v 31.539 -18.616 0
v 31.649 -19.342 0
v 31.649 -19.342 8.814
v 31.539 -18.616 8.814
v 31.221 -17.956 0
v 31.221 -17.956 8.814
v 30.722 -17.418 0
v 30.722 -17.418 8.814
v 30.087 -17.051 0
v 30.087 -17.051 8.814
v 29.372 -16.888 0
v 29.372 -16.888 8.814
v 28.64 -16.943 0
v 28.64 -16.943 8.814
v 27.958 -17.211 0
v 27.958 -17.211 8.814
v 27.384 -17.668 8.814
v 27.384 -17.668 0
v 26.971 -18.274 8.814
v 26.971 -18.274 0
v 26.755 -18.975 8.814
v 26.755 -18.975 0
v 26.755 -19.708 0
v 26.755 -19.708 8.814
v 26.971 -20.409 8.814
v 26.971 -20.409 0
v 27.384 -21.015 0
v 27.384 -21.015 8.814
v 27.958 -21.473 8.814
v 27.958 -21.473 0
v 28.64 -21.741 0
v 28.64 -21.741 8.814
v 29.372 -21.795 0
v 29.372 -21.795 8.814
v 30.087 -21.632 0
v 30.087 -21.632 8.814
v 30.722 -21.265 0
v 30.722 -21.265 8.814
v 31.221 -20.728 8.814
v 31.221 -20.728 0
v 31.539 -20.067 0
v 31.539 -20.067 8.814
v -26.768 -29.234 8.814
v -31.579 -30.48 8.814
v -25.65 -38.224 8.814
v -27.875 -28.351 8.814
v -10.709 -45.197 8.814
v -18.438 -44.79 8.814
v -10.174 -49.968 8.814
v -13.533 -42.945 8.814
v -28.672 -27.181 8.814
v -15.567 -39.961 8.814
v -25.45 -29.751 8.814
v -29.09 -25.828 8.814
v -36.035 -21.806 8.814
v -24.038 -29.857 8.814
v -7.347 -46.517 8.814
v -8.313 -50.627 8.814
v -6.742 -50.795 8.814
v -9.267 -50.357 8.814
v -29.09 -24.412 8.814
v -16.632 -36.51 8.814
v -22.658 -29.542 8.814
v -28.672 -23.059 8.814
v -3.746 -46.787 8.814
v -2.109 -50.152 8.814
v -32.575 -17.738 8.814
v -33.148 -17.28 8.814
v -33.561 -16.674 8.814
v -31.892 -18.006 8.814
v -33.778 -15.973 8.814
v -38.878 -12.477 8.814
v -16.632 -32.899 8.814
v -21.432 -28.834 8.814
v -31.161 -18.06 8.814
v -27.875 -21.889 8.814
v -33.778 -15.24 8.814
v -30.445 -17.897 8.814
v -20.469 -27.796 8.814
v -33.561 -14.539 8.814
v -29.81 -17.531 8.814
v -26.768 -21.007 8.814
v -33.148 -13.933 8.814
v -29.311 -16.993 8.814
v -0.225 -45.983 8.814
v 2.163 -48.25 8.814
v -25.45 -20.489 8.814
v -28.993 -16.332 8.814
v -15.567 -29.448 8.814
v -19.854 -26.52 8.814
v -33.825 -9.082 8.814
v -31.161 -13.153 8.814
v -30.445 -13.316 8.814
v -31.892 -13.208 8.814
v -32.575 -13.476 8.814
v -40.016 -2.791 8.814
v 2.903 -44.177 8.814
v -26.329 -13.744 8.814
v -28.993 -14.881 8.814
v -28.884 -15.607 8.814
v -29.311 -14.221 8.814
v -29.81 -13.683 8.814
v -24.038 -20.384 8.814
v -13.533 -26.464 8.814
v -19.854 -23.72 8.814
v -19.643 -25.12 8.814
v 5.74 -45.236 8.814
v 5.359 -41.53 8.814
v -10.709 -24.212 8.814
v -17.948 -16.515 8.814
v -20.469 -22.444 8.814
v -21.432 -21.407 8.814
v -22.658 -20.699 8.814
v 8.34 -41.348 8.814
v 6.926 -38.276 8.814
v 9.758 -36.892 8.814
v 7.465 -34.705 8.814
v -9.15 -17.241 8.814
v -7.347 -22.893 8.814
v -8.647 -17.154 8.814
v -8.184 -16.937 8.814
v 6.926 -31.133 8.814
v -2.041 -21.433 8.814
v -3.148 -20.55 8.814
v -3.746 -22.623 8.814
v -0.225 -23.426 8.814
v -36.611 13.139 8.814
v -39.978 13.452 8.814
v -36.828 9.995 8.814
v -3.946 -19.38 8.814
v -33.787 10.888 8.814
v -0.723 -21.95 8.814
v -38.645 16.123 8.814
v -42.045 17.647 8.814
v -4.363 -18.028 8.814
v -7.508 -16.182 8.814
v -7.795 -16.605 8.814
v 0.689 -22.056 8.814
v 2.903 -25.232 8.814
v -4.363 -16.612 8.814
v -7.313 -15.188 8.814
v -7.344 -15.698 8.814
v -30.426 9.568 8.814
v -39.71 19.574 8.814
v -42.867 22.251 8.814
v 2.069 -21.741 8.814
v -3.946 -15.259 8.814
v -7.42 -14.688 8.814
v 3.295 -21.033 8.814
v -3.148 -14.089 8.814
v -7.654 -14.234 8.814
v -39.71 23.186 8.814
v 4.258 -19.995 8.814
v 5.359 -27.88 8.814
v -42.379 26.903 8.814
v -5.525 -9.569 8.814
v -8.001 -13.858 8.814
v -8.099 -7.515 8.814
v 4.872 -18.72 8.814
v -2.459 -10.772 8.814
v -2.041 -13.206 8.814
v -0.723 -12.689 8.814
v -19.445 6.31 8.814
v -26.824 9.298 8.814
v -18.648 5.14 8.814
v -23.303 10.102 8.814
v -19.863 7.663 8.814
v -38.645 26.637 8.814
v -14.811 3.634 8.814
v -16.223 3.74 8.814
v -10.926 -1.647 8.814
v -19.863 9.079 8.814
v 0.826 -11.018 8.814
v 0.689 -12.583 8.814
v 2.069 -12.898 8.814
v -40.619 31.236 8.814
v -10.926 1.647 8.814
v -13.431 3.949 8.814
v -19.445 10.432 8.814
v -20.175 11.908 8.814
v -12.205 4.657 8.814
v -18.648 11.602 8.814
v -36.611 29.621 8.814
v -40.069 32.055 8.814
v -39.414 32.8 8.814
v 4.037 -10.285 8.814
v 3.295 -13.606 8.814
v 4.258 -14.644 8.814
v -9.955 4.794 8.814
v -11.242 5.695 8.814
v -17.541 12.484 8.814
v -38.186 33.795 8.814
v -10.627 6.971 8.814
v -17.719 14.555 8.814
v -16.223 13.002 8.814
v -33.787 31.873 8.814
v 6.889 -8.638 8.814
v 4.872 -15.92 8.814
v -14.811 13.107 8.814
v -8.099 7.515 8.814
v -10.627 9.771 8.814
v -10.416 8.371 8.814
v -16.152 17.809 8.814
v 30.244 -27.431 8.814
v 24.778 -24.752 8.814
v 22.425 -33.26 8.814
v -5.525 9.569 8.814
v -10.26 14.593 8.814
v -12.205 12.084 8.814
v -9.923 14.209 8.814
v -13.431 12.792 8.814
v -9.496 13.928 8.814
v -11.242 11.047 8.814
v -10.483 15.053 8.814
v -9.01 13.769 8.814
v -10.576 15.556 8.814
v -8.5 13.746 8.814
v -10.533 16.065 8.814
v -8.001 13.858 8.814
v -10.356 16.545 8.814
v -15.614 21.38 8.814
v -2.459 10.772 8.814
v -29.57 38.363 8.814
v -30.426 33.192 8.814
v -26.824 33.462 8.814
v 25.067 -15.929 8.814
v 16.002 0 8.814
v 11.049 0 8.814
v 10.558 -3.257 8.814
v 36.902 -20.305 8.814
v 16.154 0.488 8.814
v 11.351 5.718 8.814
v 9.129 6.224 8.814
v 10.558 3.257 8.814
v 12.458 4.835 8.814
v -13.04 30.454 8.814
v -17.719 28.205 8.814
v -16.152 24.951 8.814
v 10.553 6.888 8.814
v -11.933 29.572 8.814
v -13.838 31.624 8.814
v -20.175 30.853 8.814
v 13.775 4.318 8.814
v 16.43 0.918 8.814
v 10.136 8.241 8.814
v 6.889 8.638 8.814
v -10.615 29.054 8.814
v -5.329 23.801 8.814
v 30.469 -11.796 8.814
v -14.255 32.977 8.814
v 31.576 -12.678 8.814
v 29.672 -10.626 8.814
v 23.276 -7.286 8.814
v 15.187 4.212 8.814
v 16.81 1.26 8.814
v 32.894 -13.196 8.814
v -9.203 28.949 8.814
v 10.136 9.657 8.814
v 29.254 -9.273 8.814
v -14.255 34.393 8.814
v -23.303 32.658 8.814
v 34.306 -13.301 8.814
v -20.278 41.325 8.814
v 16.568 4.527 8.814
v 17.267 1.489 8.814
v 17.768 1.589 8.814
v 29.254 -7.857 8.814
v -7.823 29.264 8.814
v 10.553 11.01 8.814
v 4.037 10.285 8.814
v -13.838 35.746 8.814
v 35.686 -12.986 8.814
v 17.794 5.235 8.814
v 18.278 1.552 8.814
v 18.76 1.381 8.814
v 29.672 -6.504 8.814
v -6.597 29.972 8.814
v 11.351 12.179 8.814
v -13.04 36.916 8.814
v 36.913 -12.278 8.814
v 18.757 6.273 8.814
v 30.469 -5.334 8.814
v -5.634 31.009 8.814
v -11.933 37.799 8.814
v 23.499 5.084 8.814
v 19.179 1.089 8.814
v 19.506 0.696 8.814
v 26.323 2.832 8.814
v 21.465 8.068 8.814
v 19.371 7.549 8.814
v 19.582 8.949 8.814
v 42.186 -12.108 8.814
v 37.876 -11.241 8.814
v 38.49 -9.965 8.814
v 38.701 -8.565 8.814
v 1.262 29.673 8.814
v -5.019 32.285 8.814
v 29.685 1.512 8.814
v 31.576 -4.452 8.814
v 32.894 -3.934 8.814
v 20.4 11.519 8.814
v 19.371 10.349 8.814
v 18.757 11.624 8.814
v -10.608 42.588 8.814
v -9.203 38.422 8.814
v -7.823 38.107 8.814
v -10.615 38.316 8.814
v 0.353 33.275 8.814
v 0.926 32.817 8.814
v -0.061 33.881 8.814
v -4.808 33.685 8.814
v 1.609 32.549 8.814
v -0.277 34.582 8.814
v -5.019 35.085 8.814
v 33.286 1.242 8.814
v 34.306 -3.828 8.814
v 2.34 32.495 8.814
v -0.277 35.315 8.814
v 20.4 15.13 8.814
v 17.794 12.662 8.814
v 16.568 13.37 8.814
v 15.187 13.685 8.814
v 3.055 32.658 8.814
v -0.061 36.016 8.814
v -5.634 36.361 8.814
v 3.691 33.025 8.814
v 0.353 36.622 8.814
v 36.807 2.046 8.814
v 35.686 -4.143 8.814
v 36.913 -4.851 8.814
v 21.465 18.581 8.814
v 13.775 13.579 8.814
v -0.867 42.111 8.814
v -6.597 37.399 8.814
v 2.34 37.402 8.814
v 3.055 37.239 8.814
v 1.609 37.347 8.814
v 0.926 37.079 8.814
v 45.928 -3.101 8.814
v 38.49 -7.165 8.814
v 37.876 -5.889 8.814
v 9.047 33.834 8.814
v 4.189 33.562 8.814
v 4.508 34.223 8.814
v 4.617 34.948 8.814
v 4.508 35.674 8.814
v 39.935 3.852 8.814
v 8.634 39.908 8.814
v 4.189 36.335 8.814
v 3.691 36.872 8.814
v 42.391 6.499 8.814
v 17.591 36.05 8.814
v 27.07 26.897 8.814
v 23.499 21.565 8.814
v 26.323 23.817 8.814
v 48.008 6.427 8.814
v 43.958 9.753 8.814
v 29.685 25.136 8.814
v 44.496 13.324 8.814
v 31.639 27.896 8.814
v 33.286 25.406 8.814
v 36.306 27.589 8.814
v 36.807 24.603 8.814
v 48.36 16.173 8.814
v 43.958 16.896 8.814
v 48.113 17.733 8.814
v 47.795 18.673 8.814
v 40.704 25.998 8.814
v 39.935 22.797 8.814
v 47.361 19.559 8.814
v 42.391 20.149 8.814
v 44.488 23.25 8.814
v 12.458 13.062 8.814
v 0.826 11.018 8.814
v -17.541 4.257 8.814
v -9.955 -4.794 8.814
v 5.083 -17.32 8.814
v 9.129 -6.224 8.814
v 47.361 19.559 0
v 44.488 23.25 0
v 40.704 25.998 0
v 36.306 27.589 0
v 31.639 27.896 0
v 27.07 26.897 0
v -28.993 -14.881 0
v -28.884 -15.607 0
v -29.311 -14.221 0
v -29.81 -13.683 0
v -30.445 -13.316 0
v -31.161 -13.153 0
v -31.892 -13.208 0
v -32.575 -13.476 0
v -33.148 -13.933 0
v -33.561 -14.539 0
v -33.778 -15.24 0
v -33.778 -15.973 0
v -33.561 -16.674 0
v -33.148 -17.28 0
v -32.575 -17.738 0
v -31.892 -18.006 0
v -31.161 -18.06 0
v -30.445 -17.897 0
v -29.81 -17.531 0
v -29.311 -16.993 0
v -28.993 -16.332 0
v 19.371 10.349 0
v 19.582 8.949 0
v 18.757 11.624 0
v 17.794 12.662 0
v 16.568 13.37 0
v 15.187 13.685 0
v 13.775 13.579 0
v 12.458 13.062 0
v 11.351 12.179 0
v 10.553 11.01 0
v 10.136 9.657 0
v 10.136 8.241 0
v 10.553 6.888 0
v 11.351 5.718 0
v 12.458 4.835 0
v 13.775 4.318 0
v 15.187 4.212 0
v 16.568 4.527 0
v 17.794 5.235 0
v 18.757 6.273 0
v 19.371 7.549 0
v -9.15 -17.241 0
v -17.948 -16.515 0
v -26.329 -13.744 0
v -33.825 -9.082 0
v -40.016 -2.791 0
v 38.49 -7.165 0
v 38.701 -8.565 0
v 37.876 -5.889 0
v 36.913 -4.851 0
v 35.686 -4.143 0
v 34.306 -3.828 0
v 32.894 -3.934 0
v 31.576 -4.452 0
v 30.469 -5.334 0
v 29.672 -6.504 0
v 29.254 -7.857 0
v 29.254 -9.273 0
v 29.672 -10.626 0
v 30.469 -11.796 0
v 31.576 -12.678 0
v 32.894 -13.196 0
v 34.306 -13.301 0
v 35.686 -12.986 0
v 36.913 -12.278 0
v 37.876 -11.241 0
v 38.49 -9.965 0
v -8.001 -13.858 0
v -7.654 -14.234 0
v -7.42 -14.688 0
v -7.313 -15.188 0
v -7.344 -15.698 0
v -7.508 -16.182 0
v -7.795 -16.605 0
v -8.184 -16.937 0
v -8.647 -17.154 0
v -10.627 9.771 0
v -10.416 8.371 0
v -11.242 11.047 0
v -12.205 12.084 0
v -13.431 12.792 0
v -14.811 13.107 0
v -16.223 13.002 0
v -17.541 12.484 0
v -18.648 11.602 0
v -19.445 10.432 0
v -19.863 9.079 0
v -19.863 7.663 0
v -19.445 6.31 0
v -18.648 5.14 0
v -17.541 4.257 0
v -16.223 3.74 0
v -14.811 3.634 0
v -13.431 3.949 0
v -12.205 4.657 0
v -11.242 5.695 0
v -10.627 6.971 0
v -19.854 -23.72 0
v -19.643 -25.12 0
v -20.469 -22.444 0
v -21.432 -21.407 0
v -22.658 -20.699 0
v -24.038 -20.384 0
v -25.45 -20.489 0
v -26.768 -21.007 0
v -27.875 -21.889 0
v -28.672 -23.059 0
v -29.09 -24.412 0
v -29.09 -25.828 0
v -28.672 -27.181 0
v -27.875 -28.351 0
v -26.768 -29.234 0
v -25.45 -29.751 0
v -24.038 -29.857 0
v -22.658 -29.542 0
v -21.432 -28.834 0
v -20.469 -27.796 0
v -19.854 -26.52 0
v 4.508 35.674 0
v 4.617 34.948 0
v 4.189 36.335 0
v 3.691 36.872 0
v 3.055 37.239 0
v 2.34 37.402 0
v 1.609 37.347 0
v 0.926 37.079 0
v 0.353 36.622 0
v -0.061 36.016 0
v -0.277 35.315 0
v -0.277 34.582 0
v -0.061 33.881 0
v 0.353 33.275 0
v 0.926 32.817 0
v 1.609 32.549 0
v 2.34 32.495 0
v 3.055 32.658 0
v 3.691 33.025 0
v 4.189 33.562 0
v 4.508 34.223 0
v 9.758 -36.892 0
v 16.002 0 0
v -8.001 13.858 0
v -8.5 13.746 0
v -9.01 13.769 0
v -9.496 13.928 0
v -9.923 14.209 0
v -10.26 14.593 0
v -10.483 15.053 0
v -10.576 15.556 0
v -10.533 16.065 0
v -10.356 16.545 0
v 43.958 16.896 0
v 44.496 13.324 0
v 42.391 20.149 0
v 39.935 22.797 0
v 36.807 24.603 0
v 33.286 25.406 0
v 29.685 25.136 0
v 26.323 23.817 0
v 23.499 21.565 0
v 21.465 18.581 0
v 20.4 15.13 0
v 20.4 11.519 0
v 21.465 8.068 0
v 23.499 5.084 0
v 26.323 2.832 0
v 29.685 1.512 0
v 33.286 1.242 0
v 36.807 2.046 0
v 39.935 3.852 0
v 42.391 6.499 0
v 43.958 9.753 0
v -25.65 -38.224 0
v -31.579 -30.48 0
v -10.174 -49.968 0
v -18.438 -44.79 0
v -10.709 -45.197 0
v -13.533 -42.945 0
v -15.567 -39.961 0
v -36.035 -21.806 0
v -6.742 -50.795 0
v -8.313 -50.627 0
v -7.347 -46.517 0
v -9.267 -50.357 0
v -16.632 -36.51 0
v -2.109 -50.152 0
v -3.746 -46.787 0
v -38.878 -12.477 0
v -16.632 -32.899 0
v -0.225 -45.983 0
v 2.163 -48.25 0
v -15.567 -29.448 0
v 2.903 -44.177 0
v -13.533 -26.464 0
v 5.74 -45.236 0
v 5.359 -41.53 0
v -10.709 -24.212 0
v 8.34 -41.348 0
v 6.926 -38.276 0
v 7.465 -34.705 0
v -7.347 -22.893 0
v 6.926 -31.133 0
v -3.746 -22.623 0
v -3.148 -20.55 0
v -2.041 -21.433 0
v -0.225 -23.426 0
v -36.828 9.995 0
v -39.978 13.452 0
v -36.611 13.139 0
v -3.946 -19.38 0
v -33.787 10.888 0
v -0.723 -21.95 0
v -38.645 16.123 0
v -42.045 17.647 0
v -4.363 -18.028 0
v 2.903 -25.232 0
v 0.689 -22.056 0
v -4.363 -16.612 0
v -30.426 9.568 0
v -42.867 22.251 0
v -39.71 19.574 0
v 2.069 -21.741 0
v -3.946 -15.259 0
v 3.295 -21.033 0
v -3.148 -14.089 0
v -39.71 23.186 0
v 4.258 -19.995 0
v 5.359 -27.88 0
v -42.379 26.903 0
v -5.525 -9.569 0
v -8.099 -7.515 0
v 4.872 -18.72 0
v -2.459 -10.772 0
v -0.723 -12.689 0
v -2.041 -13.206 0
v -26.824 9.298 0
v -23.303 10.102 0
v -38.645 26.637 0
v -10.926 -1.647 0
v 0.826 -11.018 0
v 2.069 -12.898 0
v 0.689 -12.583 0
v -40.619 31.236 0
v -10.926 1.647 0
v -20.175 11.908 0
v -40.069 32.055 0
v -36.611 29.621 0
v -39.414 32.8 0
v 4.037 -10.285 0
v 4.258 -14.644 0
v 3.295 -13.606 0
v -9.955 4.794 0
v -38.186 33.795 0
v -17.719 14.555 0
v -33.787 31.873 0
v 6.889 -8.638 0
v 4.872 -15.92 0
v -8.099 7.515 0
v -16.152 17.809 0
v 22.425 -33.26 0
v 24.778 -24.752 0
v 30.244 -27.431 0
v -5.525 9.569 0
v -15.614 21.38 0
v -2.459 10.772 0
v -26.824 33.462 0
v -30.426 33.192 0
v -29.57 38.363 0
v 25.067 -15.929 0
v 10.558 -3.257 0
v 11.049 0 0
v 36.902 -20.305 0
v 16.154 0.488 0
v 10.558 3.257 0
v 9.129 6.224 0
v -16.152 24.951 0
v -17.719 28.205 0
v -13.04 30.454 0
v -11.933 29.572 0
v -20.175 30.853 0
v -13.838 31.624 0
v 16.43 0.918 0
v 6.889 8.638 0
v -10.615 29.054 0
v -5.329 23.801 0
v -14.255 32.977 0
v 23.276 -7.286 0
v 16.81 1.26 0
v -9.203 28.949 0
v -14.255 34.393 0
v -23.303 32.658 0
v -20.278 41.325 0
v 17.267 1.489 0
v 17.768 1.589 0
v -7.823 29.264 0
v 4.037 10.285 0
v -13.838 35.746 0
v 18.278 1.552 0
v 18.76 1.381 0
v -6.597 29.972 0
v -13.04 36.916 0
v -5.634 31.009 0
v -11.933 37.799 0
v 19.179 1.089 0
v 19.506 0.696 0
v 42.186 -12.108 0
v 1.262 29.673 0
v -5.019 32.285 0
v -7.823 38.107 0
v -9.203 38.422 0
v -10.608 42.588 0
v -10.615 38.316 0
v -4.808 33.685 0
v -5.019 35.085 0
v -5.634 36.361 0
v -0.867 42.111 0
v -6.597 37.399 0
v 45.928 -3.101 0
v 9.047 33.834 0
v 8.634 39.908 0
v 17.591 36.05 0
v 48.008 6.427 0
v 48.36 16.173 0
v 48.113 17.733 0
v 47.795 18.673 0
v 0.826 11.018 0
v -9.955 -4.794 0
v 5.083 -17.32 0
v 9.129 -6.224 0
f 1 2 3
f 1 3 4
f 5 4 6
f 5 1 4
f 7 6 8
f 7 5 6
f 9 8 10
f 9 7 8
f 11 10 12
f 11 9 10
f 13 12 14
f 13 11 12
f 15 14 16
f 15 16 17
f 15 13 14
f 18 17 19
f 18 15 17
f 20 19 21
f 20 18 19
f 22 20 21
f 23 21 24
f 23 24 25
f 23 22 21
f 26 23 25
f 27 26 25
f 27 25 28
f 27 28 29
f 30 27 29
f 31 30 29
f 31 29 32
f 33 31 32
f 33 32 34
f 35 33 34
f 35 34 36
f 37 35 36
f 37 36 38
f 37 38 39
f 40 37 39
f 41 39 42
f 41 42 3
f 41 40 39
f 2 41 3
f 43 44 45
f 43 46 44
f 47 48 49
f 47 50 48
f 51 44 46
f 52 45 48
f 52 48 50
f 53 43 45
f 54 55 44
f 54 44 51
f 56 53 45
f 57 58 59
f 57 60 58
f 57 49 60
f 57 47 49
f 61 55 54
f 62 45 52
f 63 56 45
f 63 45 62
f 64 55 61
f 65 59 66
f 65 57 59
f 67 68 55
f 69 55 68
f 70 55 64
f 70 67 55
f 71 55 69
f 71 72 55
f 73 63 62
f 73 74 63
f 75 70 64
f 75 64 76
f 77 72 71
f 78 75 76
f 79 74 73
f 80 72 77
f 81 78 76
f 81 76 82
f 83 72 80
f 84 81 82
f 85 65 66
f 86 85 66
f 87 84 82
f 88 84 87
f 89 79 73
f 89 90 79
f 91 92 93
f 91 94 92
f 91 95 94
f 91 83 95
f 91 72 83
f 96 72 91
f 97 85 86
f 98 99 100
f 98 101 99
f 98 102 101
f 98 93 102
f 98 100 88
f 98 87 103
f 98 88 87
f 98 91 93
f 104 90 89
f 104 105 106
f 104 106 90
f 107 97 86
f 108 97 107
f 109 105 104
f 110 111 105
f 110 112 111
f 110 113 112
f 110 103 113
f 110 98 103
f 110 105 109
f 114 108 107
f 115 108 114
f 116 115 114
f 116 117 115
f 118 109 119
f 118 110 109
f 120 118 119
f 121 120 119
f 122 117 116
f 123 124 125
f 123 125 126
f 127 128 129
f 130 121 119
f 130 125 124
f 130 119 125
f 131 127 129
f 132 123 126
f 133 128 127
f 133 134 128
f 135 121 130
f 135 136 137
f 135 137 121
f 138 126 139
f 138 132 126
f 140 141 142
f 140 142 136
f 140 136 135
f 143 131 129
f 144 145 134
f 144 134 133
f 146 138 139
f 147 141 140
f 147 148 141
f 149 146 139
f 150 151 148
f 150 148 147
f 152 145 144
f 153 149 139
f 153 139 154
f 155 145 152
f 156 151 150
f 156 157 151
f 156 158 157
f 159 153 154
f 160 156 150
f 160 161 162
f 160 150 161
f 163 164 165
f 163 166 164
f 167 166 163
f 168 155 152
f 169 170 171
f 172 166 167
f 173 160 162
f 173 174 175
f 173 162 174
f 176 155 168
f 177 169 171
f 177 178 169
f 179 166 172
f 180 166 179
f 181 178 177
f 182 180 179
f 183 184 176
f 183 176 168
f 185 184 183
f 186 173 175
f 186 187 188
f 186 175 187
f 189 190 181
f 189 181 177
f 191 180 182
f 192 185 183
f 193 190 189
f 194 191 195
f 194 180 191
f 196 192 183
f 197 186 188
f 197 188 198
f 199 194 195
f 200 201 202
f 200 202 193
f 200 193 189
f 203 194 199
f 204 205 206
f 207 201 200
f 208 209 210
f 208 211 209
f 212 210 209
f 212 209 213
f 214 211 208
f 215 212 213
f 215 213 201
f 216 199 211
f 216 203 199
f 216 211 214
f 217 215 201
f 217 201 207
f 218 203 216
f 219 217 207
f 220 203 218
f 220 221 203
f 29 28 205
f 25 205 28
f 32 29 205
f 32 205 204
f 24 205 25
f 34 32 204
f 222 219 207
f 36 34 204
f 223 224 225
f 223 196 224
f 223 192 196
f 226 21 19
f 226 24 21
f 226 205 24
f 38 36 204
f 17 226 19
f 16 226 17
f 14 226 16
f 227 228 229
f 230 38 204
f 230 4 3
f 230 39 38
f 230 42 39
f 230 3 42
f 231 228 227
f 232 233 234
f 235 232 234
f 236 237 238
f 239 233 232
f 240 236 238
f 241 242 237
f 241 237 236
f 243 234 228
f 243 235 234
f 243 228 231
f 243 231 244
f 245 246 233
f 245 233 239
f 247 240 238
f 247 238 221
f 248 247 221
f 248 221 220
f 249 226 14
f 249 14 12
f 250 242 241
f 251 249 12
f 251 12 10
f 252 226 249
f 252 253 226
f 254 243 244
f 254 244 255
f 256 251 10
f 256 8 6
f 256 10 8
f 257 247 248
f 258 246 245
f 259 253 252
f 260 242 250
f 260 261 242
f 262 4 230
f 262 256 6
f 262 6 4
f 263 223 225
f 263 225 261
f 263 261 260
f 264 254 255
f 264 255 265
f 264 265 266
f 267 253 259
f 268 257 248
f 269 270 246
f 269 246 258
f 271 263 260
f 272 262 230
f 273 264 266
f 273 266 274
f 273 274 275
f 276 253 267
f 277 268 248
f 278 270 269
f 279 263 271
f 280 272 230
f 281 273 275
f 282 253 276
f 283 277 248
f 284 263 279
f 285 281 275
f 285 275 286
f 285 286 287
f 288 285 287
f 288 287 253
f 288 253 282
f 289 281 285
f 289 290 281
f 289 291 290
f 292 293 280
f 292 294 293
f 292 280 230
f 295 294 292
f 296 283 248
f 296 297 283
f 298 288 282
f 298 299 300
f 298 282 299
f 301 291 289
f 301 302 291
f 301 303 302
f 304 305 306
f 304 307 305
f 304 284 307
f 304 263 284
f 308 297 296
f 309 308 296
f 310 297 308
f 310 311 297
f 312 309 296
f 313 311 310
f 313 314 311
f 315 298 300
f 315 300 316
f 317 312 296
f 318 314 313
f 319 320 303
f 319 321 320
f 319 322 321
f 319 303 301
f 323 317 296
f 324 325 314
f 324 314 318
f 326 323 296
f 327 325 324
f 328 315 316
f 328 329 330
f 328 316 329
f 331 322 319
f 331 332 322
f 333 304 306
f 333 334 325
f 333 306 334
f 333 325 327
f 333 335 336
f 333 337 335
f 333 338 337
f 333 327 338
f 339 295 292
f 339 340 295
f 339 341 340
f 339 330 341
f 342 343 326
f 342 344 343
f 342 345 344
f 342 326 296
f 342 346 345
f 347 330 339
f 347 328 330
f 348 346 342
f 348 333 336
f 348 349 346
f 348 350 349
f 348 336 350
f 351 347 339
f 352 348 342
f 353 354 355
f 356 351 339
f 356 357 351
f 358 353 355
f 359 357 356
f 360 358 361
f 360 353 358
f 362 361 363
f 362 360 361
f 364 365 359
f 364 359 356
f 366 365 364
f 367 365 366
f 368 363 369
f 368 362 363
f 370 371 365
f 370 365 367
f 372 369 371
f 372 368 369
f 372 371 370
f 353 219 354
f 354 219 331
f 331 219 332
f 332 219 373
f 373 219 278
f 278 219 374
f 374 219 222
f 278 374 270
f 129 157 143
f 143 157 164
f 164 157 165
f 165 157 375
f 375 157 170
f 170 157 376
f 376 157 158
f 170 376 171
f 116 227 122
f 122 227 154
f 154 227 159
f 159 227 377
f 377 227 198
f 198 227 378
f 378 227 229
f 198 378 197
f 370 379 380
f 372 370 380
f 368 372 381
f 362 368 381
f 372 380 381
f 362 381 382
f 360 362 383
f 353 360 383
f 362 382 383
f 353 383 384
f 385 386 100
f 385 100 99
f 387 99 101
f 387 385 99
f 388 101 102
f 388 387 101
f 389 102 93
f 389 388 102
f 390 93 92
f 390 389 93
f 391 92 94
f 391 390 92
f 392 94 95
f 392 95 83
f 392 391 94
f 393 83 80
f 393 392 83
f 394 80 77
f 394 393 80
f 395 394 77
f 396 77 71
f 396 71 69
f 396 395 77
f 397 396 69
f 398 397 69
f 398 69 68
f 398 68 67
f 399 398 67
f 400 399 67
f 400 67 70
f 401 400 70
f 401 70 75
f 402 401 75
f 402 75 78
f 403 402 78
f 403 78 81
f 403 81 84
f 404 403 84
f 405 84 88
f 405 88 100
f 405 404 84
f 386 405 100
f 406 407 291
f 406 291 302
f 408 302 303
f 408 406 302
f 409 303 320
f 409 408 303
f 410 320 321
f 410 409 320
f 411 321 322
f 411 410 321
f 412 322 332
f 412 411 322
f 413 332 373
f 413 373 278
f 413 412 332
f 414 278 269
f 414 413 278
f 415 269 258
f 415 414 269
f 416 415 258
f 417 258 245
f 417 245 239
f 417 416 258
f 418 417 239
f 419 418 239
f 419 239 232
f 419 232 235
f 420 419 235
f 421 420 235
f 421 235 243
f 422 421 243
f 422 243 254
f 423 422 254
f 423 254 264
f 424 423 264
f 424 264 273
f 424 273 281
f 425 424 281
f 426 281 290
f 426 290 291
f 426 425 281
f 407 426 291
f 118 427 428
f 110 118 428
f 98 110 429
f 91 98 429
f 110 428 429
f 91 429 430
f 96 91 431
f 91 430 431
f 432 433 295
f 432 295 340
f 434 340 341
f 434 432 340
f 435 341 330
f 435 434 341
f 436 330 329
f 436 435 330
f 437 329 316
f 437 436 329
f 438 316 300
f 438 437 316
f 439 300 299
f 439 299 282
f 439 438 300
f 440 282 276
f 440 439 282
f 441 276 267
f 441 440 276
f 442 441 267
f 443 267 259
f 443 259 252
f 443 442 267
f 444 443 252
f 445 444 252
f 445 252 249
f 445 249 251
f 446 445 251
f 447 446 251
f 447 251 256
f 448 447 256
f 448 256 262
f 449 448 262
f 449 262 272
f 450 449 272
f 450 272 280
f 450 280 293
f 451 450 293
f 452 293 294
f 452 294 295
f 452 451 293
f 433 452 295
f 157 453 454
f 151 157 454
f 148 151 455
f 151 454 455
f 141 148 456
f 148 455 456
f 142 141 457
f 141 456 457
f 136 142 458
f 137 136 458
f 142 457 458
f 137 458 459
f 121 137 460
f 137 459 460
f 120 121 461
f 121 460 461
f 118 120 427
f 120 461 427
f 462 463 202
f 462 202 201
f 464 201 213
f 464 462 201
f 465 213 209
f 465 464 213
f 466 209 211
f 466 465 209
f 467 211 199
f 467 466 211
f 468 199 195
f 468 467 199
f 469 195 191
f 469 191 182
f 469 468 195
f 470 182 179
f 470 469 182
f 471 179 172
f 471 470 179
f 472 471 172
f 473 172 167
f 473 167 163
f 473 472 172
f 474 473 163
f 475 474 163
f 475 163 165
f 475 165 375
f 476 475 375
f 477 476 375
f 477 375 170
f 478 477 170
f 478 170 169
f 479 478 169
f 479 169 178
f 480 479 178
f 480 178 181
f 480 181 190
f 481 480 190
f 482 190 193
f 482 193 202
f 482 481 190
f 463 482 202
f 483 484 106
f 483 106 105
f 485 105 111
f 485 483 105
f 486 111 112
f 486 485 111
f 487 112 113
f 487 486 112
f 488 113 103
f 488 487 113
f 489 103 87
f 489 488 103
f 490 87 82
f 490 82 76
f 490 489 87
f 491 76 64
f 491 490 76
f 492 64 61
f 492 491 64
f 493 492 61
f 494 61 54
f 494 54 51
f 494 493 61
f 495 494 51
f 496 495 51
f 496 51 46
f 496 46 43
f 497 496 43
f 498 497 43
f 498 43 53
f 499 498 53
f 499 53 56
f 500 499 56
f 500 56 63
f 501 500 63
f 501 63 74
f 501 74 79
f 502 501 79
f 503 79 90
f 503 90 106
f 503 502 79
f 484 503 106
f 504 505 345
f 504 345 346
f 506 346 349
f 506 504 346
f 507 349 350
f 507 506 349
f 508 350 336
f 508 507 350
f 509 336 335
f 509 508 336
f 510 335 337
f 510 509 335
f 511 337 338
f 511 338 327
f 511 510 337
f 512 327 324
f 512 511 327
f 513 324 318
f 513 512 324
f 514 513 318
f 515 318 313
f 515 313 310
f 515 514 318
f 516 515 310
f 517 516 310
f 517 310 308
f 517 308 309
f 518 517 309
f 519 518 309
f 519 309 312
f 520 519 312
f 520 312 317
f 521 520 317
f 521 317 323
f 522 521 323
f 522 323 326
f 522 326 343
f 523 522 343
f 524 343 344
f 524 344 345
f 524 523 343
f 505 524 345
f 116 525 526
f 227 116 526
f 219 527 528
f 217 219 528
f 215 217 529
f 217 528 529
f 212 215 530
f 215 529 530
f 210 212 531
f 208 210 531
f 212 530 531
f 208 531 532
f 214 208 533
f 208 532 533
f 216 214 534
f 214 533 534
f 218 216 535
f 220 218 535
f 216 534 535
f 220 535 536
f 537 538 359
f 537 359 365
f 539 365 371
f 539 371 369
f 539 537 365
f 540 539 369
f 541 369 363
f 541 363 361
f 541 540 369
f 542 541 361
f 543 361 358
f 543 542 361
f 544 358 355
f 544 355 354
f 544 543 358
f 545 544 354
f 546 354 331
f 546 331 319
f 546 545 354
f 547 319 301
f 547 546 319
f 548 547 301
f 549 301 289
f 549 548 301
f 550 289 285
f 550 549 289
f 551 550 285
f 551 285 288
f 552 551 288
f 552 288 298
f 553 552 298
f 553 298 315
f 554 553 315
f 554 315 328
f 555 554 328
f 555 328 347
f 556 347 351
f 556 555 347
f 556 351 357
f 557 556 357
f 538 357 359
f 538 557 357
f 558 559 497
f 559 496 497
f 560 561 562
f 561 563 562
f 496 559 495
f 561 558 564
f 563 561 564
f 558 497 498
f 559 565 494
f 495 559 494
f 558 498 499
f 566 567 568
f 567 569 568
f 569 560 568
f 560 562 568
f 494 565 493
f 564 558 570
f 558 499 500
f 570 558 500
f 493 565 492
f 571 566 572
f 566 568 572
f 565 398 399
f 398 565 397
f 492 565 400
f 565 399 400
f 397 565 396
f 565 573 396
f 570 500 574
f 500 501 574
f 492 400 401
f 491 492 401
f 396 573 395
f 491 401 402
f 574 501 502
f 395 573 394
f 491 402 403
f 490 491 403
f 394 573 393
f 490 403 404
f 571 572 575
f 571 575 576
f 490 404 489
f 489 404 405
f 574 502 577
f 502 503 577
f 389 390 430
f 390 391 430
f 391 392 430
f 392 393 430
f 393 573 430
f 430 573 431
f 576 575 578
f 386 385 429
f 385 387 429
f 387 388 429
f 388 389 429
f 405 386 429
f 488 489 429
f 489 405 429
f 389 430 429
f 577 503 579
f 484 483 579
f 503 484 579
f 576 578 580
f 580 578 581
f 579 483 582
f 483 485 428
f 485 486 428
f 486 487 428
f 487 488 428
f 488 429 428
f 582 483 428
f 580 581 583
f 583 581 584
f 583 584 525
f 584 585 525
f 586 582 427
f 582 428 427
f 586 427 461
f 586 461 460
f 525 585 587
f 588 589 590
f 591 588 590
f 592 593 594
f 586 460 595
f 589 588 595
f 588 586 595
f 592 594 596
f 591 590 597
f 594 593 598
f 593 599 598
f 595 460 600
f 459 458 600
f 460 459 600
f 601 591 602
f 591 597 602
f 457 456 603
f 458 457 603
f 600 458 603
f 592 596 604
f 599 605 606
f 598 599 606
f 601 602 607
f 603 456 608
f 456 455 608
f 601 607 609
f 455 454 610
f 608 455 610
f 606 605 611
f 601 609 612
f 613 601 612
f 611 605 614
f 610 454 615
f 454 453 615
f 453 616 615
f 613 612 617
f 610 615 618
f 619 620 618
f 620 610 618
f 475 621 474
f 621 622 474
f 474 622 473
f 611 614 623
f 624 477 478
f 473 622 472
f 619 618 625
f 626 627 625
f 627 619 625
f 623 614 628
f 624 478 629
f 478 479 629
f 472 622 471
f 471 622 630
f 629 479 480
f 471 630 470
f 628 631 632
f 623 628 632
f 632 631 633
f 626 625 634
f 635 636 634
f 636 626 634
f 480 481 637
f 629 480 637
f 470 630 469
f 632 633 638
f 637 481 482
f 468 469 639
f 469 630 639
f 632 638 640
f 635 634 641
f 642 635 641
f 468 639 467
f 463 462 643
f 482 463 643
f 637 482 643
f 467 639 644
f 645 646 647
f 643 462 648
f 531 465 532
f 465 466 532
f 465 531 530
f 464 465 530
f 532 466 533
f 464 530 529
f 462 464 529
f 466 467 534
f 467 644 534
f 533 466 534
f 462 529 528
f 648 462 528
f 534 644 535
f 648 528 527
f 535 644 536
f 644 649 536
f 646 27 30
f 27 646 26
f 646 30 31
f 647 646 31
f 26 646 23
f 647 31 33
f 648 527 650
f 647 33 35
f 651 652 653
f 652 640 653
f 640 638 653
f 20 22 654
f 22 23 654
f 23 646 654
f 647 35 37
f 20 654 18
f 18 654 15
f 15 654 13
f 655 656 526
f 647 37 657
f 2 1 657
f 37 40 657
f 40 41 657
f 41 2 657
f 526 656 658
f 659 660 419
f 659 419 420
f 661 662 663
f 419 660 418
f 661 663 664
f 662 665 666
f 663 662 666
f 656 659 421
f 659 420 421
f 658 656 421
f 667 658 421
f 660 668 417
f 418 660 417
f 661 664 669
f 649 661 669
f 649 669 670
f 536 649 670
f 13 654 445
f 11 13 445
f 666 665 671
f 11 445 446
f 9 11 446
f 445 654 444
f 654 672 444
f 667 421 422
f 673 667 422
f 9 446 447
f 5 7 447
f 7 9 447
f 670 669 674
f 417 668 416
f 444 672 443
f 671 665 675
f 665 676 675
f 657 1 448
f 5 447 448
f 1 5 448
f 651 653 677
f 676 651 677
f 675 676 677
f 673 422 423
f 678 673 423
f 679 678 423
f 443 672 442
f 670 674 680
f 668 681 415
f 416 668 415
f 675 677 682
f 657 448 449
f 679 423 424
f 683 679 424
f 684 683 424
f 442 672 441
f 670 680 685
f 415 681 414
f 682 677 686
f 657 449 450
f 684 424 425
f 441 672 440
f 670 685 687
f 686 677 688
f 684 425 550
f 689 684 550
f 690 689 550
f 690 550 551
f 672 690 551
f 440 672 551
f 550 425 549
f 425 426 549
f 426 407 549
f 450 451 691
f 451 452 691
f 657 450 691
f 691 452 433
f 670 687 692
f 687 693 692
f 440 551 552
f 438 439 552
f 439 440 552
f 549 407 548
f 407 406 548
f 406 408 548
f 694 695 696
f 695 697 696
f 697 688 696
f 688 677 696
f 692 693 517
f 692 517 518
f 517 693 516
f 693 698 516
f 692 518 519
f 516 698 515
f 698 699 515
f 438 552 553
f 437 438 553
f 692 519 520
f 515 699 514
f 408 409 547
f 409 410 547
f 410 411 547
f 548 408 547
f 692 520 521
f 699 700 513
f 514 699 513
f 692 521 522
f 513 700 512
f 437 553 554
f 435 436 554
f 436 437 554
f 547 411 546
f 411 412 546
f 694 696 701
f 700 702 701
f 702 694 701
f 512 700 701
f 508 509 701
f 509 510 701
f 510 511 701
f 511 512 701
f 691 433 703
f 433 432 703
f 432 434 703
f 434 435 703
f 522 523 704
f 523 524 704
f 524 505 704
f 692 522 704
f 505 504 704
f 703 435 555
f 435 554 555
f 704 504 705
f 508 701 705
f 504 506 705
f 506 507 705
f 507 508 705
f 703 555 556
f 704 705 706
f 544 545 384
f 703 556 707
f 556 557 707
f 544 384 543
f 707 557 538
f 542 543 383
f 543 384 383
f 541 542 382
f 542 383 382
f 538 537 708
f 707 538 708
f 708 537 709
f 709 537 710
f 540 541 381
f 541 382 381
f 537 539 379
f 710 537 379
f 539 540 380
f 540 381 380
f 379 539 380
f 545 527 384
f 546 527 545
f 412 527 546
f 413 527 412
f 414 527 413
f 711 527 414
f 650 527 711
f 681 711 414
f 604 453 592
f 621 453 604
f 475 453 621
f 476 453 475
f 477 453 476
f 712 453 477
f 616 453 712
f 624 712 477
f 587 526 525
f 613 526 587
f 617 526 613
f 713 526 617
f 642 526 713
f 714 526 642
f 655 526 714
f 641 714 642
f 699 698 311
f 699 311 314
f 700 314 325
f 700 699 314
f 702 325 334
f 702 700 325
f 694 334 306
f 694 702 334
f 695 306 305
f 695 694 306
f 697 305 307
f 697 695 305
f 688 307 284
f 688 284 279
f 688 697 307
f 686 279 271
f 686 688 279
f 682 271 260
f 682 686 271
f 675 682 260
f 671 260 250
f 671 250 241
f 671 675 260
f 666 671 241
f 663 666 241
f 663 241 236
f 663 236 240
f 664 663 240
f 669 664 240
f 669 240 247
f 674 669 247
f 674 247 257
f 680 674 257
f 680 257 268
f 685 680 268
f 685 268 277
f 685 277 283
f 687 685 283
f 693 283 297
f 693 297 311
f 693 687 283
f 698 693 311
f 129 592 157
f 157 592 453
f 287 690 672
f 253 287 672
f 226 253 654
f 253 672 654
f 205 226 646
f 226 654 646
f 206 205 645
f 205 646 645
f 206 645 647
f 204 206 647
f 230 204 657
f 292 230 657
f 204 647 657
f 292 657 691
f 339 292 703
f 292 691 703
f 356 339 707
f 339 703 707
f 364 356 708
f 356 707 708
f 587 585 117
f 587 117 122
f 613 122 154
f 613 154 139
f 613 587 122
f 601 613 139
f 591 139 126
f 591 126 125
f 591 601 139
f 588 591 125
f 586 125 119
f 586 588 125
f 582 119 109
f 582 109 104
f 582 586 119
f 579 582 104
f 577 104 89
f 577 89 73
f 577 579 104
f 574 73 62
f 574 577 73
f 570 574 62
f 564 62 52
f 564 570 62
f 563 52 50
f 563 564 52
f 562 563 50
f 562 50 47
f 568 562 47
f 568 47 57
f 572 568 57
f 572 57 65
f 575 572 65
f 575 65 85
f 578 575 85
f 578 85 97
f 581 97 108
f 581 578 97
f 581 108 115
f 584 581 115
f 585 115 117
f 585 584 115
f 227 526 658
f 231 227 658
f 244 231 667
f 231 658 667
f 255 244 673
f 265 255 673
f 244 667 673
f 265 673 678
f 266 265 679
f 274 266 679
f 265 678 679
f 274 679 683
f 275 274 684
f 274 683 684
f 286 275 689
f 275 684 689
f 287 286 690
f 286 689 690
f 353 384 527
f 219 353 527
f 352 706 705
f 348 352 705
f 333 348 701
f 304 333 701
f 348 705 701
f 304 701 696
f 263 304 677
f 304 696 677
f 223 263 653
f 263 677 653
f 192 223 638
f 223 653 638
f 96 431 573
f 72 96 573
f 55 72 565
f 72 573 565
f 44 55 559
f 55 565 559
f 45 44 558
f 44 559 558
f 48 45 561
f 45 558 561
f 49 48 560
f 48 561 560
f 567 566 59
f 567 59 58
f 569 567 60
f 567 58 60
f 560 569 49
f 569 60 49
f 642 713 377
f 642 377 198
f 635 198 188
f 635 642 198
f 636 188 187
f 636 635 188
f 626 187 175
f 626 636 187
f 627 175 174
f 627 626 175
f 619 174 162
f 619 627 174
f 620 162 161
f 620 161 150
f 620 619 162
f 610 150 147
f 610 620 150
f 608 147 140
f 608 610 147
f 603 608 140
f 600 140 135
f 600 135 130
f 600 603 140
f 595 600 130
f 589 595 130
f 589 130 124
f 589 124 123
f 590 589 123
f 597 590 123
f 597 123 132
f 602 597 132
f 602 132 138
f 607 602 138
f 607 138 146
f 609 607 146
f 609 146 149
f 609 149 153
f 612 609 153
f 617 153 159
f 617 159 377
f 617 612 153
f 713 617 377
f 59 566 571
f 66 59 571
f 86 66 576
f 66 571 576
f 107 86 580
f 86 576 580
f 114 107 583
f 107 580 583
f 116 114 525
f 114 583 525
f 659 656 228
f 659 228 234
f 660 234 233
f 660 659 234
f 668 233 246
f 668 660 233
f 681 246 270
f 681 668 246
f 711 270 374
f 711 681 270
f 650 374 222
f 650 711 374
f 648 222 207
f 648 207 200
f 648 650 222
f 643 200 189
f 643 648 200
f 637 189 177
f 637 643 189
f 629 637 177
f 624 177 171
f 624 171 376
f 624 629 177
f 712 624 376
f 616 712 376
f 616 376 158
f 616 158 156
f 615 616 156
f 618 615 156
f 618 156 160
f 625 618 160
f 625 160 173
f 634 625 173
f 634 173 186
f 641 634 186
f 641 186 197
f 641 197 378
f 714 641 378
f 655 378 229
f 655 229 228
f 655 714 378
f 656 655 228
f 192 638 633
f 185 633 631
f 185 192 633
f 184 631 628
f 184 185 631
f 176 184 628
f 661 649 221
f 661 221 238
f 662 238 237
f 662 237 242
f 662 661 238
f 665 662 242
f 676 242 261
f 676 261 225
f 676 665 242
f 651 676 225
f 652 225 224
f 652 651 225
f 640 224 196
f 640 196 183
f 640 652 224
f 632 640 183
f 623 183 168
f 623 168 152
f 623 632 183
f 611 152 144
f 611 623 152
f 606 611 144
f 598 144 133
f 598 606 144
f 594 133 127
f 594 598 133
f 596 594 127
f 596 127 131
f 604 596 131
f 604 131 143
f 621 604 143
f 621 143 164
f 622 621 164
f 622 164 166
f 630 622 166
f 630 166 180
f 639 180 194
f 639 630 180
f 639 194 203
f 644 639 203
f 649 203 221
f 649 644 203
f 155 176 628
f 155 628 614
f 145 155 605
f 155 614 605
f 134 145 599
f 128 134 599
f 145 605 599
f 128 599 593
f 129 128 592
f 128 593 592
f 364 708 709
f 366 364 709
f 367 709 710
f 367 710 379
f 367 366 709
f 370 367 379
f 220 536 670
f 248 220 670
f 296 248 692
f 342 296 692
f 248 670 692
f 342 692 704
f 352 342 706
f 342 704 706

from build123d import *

# Parameters (mm, degrees)
F0_R     = 4.7498
F0_R_2   = 2.460625
F0_R_3   = 12.1158
F0_R_4   = 11.049
F1_DEPTH = 8.8138
F2_R     = 7.62


with BuildPart() as f1:
    # F0 (on Top) → F1 (new body)
    with BuildSketch(Plane.XY):
        with BuildLine():
            ThreePointArc((22.424904, -33.259839), (42.551194, -11.399454), (48.252126, 17.762907))
            ThreePointArc((48.252126, 17.762907), (39.493301, 26.578964), (27.069985, 26.89691))
            Line((27.069985, 26.89691), (-8.001, 13.858139))
            ThreePointArc((-8.001, 13.858139), (-10.104465, 14.389846), (-10.355861, 16.544859))
            ThreePointArc((-10.355861, 16.544859), (1.261852, 29.673183), (17.591413, 36.050455))
            ThreePointArc((17.591413, 36.050455), (-11.40338, 42.550142), (-39.509192, 32.906113))
            ThreePointArc((-39.509192, 32.906113), (-42.764709, 20.91272), (-36.8284, 9.99484))
            Line((-36.8284, 9.99484), (-8.001, -13.858139))
            ThreePointArc((-8.001, -13.858139), (-7.40974, -15.945647), (-9.150338, -17.240868))
            ThreePointArc((-9.150338, -17.240868), (-26.328657, -13.743796), (-40.016317, -2.790617))
            ThreePointArc((-40.016317, -2.790617), (-31.147814, -31.150688), (-8.742934, -50.669021))
            ThreePointArc((-8.742934, -50.669021), (3.271408, -47.491684), (9.758415, -36.891749))
            Line((9.758415, -36.891749), (16.002, 0))
            ThreePointArc((16.002, 0), (17.514205, 1.5558), (19.506198, 0.696009))
            ThreePointArc((19.506198, 0.696009), (25.066804, -15.929388), (22.424904, -33.259839))
        make_face()
        with Locations((-24.393054, -25.120101)):
            Circle(F0_R, mode=Mode.SUBTRACT)
        with Locations((-31.344392, -15.606719)):
            Circle(F0_R_2, mode=Mode.SUBTRACT)
        with Locations((-4.651044, -34.704587)):
            Circle(F0_R_3, mode=Mode.SUBTRACT)
        with Locations((0.333594, -17.319588)):
            Circle(F0_R, mode=Mode.SUBTRACT)
        Circle(F0_R_4, mode=Mode.SUBTRACT)
        with Locations((-27.729533, 21.380216)):
            Circle(F0_R_3, mode=Mode.SUBTRACT)
        with Locations((-15.166, 8.370893)):
            Circle(F0_R, mode=Mode.SUBTRACT)
        with Locations((-9.558119, 33.685055)):
            Circle(F0_R, mode=Mode.SUBTRACT)
        with Locations((2.156381, 34.948399)):
            Circle(F0_R_2, mode=Mode.SUBTRACT)
        with Locations((29.188011, -19.34168)):
            Circle(F0_R_2, mode=Mode.SUBTRACT)
        with Locations((33.951173, -8.564954)):
            Circle(F0_R, mode=Mode.SUBTRACT)
        with Locations((14.832406, 8.948695)):
            Circle(F0_R, mode=Mode.SUBTRACT)
        with Locations((32.380576, 13.324372)):
            Circle(F0_R_3, mode=Mode.SUBTRACT)
    extrude(amount=F1_DEPTH)

    # F2
    f2_edges = [f1.edges().sort_by_distance(p)[0] for p in [
        (-39.509192, 32.906113, 4.4069),
        (48.252126, 17.762907, 4.4069),
        (-8.742934, -50.669021, 4.4069),
    ]]
    fillet(f2_edges, radius=F2_R)


solid = f1.part
